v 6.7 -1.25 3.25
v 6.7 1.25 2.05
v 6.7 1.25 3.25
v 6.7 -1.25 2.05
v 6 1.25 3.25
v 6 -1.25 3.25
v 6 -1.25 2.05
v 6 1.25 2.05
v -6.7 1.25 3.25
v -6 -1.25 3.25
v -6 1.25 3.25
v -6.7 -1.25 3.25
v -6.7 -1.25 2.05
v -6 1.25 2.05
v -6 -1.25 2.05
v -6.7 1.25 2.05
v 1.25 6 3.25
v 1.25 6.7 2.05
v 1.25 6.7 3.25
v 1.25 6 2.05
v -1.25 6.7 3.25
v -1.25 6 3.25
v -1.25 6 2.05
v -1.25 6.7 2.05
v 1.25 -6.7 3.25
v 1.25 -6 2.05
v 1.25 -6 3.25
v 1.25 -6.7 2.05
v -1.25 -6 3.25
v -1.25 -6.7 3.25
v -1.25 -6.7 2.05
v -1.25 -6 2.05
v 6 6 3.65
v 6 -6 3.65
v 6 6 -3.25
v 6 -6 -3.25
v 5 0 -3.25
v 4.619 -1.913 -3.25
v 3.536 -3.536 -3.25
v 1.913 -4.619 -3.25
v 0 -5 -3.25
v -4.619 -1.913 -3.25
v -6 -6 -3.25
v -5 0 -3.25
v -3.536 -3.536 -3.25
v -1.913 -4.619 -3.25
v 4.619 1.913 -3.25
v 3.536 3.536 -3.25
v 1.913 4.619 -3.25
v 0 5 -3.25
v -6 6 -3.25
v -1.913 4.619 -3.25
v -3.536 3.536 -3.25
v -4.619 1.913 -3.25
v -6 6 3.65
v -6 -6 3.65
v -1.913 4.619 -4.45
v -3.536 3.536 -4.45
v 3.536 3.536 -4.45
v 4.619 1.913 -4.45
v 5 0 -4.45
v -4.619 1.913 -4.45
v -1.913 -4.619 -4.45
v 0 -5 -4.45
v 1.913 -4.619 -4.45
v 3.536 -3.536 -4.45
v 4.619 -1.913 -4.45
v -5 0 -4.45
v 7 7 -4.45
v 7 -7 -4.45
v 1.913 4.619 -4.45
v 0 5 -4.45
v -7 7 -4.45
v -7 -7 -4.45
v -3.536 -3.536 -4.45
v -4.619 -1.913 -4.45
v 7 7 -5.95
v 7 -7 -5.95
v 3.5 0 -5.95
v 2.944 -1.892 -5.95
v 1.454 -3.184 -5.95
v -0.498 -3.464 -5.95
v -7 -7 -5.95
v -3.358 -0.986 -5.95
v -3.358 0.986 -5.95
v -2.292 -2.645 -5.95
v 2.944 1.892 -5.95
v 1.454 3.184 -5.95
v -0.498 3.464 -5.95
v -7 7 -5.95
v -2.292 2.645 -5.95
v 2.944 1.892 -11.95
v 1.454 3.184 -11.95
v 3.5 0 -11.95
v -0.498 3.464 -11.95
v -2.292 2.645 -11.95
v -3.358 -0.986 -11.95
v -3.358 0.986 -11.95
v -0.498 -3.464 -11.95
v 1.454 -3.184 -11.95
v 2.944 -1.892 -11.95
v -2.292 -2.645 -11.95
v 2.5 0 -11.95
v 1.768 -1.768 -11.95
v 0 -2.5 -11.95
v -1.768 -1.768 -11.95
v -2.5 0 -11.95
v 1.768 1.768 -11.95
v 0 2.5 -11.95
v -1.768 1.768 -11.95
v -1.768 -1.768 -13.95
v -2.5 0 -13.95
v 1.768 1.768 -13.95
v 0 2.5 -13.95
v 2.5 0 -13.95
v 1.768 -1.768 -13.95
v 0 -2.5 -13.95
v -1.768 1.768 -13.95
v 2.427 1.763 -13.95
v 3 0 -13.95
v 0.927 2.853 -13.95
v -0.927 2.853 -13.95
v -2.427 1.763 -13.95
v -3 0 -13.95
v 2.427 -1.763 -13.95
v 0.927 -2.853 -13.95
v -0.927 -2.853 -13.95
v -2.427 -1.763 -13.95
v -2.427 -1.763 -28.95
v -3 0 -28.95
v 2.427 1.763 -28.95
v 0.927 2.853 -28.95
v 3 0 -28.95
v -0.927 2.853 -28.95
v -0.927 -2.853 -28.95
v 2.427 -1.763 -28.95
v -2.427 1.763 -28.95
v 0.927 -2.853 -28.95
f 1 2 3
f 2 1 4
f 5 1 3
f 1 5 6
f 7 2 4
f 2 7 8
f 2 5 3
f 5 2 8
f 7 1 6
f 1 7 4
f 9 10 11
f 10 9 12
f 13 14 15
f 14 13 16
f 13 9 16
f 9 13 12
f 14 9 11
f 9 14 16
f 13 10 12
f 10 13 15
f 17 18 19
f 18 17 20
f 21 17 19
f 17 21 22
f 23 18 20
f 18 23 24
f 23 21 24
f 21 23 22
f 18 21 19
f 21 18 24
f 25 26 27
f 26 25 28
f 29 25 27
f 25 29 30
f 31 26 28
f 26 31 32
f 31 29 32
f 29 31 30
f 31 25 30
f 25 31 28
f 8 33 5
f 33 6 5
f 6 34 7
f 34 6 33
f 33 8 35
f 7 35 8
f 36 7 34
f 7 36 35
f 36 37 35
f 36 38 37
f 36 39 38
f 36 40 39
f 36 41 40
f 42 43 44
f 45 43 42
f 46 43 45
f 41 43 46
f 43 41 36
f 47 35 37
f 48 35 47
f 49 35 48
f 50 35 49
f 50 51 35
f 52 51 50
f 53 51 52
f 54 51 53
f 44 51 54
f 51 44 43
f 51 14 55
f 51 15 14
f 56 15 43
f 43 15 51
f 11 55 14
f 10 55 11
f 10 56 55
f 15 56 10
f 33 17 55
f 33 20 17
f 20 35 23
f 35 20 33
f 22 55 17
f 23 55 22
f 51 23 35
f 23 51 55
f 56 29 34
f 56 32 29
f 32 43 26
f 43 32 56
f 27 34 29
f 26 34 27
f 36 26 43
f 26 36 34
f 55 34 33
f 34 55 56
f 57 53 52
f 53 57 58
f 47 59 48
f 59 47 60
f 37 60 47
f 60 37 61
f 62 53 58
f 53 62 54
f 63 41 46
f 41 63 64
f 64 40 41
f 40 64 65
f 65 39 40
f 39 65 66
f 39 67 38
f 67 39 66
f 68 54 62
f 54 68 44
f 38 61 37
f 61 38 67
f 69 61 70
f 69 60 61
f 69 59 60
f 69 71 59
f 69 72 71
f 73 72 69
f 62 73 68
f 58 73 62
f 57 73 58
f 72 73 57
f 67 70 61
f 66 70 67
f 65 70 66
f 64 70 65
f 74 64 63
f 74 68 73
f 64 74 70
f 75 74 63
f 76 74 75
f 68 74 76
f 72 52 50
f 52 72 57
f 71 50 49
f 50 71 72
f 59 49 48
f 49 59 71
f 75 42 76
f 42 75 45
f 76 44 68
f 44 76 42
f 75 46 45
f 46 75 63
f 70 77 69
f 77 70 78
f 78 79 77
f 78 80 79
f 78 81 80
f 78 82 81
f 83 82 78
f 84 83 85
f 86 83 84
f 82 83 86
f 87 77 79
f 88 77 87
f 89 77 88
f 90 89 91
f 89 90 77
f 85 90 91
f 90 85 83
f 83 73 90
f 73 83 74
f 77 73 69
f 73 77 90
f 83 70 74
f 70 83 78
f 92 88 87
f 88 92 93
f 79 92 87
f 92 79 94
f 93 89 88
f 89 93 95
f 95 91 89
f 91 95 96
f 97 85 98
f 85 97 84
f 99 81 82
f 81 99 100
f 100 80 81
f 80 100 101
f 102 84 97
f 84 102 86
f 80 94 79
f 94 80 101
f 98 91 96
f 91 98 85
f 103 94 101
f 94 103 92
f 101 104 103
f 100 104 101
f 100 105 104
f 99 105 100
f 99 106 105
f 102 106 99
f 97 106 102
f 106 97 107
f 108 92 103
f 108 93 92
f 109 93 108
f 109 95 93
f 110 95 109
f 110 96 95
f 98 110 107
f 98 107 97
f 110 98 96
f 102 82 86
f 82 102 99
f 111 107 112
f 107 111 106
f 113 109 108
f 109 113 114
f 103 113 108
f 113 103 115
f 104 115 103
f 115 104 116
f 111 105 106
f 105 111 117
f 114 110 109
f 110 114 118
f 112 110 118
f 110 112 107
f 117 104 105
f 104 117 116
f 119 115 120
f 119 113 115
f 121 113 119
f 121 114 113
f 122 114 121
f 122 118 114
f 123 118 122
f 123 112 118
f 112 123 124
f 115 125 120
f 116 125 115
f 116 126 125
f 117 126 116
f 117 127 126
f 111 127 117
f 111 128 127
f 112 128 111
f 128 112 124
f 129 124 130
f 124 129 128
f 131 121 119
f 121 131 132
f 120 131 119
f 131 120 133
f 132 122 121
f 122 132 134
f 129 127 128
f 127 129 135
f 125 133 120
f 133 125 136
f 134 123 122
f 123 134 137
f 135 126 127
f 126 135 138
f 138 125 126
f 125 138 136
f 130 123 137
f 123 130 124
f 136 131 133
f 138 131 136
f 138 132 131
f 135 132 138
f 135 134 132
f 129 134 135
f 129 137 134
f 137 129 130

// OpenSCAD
// Parameters
type_vector_0 = 12; //[6:24:0.5]
type_vector_1 = 12; //[6:24:0.5]
type_vector_2 = 6.5; //[3.25:13:0.25]
type_vector_3 = 1; //[0.5:2:0.1]
thickness = 3; //[1.5:6:0.5]
shaft_length = 15; //[7.5:30:0.5]
value = 0; //[0:1:1]
eps = 0.8; //[0.5:2:0.1]
body_w = 12; //[6:24:0.5]
body_d = 12; //[6:24:0.5]
body_h = 6.5; //[3.25:13:0.25]
corner_r = 1; //[0.5:2:0.1]
wafer_h = 1.2; //[0.6:2.4:0.1]
face_w = 14; //[7:28:0.5]
face_d = 14; //[7:28:0.5]
face_h = 1.5; //[0.8:3:0.1]
boss_d = 10; //[5:20:0.5]
boss_h = 2; //[1:4:0.1]
thread_d = 7; //[3.5:14:0.25]
thread_h = 6; //[3:12:0.25]
shaft_d = 6; //[3:12:0.25]
neck_d = 5; //[2.5:10:0.25]
neck_h = 2; //[1:4:0.1]
spigot_w = 3; //[1.5:6:0.25]
spigot_d = 2; //[1:4:0.25]
spigot_h = 1.5; //[0.8:3:0.1]
spigot_x_offset = 4; //[2:8:0.25]
tab_w = 2.5; //[1.25:5:0.25]
tab_d = 1.5; //[0.8:3:0.1]
tab_h = 1.2; //[0.6:2.4:0.1]

// Potentiometer - complete geometry
module potentiometer() {
  color([0.15, 0.2, 0.35]) {
    // Potentiometer Body
    translate([0, 0, 0])
      cube([body_w, body_d, body_h], center=true);

    // Wafer Section
    translate([0, 0, body_h/2 + wafer_h/2 - eps])
      cube([body_w, body_d, wafer_h], center=true);

    // Mounting Boss
    translate([0, 0, -body_h/2 - boss_h/2 + eps])
      cylinder(r=boss_d/2, h=boss_h, center=true);

    // Mounting Face Plate
    translate([0, 0, -body_h/2 - boss_h - face_h/2 + eps])
      cube([face_w, face_d, face_h], center=true);

    // Threaded Bushing
    translate([0, 0, -body_h/2 - boss_h - face_h - thread_h/2 + eps])
      cylinder(r=thread_d/2, h=thread_h, center=true);

    // Shaft Neck
    translate([0, 0, -body_h/2 - boss_h - face_h - thread_h - neck_h/2 + eps])
      cylinder(r=neck_d/2, h=neck_h, center=true);

    // Shaft
    translate([0, 0, -body_h/2 - boss_h - face_h - thread_h - neck_h - shaft_length/2 + eps])
      cylinder(r=shaft_d/2, h=shaft_length, center=true);

    // Anti-Rotation Spigot
    translate([spigot_x_offset, 0, -body_h/2 - boss_h - face_h/2 + eps])
      cube([spigot_w, spigot_d, spigot_h], center=true);

    // Retention Tabs
    union() {
      translate([body_w/2 + tab_d/2 - eps, 0, body_h/2 - tab_h/2])
        cube([tab_d, tab_w, tab_h], center=true);
      translate([-(body_w/2 + tab_d/2 - eps), 0, body_h/2 - tab_h/2])
        cube([tab_d, tab_w, tab_h], center=true);
      translate([0, body_d/2 + tab_d/2 - eps, body_h/2 - tab_h/2])
        cube([tab_w, tab_d, tab_h], center=true);
      translate([0, -(body_d/2 + tab_d/2 - eps), body_h/2 - tab_h/2])
        cube([tab_w, tab_d, tab_h], center=true);
    }
  }
}

// Assembly
module assembly() {
  potentiometer();
}

assembly();
